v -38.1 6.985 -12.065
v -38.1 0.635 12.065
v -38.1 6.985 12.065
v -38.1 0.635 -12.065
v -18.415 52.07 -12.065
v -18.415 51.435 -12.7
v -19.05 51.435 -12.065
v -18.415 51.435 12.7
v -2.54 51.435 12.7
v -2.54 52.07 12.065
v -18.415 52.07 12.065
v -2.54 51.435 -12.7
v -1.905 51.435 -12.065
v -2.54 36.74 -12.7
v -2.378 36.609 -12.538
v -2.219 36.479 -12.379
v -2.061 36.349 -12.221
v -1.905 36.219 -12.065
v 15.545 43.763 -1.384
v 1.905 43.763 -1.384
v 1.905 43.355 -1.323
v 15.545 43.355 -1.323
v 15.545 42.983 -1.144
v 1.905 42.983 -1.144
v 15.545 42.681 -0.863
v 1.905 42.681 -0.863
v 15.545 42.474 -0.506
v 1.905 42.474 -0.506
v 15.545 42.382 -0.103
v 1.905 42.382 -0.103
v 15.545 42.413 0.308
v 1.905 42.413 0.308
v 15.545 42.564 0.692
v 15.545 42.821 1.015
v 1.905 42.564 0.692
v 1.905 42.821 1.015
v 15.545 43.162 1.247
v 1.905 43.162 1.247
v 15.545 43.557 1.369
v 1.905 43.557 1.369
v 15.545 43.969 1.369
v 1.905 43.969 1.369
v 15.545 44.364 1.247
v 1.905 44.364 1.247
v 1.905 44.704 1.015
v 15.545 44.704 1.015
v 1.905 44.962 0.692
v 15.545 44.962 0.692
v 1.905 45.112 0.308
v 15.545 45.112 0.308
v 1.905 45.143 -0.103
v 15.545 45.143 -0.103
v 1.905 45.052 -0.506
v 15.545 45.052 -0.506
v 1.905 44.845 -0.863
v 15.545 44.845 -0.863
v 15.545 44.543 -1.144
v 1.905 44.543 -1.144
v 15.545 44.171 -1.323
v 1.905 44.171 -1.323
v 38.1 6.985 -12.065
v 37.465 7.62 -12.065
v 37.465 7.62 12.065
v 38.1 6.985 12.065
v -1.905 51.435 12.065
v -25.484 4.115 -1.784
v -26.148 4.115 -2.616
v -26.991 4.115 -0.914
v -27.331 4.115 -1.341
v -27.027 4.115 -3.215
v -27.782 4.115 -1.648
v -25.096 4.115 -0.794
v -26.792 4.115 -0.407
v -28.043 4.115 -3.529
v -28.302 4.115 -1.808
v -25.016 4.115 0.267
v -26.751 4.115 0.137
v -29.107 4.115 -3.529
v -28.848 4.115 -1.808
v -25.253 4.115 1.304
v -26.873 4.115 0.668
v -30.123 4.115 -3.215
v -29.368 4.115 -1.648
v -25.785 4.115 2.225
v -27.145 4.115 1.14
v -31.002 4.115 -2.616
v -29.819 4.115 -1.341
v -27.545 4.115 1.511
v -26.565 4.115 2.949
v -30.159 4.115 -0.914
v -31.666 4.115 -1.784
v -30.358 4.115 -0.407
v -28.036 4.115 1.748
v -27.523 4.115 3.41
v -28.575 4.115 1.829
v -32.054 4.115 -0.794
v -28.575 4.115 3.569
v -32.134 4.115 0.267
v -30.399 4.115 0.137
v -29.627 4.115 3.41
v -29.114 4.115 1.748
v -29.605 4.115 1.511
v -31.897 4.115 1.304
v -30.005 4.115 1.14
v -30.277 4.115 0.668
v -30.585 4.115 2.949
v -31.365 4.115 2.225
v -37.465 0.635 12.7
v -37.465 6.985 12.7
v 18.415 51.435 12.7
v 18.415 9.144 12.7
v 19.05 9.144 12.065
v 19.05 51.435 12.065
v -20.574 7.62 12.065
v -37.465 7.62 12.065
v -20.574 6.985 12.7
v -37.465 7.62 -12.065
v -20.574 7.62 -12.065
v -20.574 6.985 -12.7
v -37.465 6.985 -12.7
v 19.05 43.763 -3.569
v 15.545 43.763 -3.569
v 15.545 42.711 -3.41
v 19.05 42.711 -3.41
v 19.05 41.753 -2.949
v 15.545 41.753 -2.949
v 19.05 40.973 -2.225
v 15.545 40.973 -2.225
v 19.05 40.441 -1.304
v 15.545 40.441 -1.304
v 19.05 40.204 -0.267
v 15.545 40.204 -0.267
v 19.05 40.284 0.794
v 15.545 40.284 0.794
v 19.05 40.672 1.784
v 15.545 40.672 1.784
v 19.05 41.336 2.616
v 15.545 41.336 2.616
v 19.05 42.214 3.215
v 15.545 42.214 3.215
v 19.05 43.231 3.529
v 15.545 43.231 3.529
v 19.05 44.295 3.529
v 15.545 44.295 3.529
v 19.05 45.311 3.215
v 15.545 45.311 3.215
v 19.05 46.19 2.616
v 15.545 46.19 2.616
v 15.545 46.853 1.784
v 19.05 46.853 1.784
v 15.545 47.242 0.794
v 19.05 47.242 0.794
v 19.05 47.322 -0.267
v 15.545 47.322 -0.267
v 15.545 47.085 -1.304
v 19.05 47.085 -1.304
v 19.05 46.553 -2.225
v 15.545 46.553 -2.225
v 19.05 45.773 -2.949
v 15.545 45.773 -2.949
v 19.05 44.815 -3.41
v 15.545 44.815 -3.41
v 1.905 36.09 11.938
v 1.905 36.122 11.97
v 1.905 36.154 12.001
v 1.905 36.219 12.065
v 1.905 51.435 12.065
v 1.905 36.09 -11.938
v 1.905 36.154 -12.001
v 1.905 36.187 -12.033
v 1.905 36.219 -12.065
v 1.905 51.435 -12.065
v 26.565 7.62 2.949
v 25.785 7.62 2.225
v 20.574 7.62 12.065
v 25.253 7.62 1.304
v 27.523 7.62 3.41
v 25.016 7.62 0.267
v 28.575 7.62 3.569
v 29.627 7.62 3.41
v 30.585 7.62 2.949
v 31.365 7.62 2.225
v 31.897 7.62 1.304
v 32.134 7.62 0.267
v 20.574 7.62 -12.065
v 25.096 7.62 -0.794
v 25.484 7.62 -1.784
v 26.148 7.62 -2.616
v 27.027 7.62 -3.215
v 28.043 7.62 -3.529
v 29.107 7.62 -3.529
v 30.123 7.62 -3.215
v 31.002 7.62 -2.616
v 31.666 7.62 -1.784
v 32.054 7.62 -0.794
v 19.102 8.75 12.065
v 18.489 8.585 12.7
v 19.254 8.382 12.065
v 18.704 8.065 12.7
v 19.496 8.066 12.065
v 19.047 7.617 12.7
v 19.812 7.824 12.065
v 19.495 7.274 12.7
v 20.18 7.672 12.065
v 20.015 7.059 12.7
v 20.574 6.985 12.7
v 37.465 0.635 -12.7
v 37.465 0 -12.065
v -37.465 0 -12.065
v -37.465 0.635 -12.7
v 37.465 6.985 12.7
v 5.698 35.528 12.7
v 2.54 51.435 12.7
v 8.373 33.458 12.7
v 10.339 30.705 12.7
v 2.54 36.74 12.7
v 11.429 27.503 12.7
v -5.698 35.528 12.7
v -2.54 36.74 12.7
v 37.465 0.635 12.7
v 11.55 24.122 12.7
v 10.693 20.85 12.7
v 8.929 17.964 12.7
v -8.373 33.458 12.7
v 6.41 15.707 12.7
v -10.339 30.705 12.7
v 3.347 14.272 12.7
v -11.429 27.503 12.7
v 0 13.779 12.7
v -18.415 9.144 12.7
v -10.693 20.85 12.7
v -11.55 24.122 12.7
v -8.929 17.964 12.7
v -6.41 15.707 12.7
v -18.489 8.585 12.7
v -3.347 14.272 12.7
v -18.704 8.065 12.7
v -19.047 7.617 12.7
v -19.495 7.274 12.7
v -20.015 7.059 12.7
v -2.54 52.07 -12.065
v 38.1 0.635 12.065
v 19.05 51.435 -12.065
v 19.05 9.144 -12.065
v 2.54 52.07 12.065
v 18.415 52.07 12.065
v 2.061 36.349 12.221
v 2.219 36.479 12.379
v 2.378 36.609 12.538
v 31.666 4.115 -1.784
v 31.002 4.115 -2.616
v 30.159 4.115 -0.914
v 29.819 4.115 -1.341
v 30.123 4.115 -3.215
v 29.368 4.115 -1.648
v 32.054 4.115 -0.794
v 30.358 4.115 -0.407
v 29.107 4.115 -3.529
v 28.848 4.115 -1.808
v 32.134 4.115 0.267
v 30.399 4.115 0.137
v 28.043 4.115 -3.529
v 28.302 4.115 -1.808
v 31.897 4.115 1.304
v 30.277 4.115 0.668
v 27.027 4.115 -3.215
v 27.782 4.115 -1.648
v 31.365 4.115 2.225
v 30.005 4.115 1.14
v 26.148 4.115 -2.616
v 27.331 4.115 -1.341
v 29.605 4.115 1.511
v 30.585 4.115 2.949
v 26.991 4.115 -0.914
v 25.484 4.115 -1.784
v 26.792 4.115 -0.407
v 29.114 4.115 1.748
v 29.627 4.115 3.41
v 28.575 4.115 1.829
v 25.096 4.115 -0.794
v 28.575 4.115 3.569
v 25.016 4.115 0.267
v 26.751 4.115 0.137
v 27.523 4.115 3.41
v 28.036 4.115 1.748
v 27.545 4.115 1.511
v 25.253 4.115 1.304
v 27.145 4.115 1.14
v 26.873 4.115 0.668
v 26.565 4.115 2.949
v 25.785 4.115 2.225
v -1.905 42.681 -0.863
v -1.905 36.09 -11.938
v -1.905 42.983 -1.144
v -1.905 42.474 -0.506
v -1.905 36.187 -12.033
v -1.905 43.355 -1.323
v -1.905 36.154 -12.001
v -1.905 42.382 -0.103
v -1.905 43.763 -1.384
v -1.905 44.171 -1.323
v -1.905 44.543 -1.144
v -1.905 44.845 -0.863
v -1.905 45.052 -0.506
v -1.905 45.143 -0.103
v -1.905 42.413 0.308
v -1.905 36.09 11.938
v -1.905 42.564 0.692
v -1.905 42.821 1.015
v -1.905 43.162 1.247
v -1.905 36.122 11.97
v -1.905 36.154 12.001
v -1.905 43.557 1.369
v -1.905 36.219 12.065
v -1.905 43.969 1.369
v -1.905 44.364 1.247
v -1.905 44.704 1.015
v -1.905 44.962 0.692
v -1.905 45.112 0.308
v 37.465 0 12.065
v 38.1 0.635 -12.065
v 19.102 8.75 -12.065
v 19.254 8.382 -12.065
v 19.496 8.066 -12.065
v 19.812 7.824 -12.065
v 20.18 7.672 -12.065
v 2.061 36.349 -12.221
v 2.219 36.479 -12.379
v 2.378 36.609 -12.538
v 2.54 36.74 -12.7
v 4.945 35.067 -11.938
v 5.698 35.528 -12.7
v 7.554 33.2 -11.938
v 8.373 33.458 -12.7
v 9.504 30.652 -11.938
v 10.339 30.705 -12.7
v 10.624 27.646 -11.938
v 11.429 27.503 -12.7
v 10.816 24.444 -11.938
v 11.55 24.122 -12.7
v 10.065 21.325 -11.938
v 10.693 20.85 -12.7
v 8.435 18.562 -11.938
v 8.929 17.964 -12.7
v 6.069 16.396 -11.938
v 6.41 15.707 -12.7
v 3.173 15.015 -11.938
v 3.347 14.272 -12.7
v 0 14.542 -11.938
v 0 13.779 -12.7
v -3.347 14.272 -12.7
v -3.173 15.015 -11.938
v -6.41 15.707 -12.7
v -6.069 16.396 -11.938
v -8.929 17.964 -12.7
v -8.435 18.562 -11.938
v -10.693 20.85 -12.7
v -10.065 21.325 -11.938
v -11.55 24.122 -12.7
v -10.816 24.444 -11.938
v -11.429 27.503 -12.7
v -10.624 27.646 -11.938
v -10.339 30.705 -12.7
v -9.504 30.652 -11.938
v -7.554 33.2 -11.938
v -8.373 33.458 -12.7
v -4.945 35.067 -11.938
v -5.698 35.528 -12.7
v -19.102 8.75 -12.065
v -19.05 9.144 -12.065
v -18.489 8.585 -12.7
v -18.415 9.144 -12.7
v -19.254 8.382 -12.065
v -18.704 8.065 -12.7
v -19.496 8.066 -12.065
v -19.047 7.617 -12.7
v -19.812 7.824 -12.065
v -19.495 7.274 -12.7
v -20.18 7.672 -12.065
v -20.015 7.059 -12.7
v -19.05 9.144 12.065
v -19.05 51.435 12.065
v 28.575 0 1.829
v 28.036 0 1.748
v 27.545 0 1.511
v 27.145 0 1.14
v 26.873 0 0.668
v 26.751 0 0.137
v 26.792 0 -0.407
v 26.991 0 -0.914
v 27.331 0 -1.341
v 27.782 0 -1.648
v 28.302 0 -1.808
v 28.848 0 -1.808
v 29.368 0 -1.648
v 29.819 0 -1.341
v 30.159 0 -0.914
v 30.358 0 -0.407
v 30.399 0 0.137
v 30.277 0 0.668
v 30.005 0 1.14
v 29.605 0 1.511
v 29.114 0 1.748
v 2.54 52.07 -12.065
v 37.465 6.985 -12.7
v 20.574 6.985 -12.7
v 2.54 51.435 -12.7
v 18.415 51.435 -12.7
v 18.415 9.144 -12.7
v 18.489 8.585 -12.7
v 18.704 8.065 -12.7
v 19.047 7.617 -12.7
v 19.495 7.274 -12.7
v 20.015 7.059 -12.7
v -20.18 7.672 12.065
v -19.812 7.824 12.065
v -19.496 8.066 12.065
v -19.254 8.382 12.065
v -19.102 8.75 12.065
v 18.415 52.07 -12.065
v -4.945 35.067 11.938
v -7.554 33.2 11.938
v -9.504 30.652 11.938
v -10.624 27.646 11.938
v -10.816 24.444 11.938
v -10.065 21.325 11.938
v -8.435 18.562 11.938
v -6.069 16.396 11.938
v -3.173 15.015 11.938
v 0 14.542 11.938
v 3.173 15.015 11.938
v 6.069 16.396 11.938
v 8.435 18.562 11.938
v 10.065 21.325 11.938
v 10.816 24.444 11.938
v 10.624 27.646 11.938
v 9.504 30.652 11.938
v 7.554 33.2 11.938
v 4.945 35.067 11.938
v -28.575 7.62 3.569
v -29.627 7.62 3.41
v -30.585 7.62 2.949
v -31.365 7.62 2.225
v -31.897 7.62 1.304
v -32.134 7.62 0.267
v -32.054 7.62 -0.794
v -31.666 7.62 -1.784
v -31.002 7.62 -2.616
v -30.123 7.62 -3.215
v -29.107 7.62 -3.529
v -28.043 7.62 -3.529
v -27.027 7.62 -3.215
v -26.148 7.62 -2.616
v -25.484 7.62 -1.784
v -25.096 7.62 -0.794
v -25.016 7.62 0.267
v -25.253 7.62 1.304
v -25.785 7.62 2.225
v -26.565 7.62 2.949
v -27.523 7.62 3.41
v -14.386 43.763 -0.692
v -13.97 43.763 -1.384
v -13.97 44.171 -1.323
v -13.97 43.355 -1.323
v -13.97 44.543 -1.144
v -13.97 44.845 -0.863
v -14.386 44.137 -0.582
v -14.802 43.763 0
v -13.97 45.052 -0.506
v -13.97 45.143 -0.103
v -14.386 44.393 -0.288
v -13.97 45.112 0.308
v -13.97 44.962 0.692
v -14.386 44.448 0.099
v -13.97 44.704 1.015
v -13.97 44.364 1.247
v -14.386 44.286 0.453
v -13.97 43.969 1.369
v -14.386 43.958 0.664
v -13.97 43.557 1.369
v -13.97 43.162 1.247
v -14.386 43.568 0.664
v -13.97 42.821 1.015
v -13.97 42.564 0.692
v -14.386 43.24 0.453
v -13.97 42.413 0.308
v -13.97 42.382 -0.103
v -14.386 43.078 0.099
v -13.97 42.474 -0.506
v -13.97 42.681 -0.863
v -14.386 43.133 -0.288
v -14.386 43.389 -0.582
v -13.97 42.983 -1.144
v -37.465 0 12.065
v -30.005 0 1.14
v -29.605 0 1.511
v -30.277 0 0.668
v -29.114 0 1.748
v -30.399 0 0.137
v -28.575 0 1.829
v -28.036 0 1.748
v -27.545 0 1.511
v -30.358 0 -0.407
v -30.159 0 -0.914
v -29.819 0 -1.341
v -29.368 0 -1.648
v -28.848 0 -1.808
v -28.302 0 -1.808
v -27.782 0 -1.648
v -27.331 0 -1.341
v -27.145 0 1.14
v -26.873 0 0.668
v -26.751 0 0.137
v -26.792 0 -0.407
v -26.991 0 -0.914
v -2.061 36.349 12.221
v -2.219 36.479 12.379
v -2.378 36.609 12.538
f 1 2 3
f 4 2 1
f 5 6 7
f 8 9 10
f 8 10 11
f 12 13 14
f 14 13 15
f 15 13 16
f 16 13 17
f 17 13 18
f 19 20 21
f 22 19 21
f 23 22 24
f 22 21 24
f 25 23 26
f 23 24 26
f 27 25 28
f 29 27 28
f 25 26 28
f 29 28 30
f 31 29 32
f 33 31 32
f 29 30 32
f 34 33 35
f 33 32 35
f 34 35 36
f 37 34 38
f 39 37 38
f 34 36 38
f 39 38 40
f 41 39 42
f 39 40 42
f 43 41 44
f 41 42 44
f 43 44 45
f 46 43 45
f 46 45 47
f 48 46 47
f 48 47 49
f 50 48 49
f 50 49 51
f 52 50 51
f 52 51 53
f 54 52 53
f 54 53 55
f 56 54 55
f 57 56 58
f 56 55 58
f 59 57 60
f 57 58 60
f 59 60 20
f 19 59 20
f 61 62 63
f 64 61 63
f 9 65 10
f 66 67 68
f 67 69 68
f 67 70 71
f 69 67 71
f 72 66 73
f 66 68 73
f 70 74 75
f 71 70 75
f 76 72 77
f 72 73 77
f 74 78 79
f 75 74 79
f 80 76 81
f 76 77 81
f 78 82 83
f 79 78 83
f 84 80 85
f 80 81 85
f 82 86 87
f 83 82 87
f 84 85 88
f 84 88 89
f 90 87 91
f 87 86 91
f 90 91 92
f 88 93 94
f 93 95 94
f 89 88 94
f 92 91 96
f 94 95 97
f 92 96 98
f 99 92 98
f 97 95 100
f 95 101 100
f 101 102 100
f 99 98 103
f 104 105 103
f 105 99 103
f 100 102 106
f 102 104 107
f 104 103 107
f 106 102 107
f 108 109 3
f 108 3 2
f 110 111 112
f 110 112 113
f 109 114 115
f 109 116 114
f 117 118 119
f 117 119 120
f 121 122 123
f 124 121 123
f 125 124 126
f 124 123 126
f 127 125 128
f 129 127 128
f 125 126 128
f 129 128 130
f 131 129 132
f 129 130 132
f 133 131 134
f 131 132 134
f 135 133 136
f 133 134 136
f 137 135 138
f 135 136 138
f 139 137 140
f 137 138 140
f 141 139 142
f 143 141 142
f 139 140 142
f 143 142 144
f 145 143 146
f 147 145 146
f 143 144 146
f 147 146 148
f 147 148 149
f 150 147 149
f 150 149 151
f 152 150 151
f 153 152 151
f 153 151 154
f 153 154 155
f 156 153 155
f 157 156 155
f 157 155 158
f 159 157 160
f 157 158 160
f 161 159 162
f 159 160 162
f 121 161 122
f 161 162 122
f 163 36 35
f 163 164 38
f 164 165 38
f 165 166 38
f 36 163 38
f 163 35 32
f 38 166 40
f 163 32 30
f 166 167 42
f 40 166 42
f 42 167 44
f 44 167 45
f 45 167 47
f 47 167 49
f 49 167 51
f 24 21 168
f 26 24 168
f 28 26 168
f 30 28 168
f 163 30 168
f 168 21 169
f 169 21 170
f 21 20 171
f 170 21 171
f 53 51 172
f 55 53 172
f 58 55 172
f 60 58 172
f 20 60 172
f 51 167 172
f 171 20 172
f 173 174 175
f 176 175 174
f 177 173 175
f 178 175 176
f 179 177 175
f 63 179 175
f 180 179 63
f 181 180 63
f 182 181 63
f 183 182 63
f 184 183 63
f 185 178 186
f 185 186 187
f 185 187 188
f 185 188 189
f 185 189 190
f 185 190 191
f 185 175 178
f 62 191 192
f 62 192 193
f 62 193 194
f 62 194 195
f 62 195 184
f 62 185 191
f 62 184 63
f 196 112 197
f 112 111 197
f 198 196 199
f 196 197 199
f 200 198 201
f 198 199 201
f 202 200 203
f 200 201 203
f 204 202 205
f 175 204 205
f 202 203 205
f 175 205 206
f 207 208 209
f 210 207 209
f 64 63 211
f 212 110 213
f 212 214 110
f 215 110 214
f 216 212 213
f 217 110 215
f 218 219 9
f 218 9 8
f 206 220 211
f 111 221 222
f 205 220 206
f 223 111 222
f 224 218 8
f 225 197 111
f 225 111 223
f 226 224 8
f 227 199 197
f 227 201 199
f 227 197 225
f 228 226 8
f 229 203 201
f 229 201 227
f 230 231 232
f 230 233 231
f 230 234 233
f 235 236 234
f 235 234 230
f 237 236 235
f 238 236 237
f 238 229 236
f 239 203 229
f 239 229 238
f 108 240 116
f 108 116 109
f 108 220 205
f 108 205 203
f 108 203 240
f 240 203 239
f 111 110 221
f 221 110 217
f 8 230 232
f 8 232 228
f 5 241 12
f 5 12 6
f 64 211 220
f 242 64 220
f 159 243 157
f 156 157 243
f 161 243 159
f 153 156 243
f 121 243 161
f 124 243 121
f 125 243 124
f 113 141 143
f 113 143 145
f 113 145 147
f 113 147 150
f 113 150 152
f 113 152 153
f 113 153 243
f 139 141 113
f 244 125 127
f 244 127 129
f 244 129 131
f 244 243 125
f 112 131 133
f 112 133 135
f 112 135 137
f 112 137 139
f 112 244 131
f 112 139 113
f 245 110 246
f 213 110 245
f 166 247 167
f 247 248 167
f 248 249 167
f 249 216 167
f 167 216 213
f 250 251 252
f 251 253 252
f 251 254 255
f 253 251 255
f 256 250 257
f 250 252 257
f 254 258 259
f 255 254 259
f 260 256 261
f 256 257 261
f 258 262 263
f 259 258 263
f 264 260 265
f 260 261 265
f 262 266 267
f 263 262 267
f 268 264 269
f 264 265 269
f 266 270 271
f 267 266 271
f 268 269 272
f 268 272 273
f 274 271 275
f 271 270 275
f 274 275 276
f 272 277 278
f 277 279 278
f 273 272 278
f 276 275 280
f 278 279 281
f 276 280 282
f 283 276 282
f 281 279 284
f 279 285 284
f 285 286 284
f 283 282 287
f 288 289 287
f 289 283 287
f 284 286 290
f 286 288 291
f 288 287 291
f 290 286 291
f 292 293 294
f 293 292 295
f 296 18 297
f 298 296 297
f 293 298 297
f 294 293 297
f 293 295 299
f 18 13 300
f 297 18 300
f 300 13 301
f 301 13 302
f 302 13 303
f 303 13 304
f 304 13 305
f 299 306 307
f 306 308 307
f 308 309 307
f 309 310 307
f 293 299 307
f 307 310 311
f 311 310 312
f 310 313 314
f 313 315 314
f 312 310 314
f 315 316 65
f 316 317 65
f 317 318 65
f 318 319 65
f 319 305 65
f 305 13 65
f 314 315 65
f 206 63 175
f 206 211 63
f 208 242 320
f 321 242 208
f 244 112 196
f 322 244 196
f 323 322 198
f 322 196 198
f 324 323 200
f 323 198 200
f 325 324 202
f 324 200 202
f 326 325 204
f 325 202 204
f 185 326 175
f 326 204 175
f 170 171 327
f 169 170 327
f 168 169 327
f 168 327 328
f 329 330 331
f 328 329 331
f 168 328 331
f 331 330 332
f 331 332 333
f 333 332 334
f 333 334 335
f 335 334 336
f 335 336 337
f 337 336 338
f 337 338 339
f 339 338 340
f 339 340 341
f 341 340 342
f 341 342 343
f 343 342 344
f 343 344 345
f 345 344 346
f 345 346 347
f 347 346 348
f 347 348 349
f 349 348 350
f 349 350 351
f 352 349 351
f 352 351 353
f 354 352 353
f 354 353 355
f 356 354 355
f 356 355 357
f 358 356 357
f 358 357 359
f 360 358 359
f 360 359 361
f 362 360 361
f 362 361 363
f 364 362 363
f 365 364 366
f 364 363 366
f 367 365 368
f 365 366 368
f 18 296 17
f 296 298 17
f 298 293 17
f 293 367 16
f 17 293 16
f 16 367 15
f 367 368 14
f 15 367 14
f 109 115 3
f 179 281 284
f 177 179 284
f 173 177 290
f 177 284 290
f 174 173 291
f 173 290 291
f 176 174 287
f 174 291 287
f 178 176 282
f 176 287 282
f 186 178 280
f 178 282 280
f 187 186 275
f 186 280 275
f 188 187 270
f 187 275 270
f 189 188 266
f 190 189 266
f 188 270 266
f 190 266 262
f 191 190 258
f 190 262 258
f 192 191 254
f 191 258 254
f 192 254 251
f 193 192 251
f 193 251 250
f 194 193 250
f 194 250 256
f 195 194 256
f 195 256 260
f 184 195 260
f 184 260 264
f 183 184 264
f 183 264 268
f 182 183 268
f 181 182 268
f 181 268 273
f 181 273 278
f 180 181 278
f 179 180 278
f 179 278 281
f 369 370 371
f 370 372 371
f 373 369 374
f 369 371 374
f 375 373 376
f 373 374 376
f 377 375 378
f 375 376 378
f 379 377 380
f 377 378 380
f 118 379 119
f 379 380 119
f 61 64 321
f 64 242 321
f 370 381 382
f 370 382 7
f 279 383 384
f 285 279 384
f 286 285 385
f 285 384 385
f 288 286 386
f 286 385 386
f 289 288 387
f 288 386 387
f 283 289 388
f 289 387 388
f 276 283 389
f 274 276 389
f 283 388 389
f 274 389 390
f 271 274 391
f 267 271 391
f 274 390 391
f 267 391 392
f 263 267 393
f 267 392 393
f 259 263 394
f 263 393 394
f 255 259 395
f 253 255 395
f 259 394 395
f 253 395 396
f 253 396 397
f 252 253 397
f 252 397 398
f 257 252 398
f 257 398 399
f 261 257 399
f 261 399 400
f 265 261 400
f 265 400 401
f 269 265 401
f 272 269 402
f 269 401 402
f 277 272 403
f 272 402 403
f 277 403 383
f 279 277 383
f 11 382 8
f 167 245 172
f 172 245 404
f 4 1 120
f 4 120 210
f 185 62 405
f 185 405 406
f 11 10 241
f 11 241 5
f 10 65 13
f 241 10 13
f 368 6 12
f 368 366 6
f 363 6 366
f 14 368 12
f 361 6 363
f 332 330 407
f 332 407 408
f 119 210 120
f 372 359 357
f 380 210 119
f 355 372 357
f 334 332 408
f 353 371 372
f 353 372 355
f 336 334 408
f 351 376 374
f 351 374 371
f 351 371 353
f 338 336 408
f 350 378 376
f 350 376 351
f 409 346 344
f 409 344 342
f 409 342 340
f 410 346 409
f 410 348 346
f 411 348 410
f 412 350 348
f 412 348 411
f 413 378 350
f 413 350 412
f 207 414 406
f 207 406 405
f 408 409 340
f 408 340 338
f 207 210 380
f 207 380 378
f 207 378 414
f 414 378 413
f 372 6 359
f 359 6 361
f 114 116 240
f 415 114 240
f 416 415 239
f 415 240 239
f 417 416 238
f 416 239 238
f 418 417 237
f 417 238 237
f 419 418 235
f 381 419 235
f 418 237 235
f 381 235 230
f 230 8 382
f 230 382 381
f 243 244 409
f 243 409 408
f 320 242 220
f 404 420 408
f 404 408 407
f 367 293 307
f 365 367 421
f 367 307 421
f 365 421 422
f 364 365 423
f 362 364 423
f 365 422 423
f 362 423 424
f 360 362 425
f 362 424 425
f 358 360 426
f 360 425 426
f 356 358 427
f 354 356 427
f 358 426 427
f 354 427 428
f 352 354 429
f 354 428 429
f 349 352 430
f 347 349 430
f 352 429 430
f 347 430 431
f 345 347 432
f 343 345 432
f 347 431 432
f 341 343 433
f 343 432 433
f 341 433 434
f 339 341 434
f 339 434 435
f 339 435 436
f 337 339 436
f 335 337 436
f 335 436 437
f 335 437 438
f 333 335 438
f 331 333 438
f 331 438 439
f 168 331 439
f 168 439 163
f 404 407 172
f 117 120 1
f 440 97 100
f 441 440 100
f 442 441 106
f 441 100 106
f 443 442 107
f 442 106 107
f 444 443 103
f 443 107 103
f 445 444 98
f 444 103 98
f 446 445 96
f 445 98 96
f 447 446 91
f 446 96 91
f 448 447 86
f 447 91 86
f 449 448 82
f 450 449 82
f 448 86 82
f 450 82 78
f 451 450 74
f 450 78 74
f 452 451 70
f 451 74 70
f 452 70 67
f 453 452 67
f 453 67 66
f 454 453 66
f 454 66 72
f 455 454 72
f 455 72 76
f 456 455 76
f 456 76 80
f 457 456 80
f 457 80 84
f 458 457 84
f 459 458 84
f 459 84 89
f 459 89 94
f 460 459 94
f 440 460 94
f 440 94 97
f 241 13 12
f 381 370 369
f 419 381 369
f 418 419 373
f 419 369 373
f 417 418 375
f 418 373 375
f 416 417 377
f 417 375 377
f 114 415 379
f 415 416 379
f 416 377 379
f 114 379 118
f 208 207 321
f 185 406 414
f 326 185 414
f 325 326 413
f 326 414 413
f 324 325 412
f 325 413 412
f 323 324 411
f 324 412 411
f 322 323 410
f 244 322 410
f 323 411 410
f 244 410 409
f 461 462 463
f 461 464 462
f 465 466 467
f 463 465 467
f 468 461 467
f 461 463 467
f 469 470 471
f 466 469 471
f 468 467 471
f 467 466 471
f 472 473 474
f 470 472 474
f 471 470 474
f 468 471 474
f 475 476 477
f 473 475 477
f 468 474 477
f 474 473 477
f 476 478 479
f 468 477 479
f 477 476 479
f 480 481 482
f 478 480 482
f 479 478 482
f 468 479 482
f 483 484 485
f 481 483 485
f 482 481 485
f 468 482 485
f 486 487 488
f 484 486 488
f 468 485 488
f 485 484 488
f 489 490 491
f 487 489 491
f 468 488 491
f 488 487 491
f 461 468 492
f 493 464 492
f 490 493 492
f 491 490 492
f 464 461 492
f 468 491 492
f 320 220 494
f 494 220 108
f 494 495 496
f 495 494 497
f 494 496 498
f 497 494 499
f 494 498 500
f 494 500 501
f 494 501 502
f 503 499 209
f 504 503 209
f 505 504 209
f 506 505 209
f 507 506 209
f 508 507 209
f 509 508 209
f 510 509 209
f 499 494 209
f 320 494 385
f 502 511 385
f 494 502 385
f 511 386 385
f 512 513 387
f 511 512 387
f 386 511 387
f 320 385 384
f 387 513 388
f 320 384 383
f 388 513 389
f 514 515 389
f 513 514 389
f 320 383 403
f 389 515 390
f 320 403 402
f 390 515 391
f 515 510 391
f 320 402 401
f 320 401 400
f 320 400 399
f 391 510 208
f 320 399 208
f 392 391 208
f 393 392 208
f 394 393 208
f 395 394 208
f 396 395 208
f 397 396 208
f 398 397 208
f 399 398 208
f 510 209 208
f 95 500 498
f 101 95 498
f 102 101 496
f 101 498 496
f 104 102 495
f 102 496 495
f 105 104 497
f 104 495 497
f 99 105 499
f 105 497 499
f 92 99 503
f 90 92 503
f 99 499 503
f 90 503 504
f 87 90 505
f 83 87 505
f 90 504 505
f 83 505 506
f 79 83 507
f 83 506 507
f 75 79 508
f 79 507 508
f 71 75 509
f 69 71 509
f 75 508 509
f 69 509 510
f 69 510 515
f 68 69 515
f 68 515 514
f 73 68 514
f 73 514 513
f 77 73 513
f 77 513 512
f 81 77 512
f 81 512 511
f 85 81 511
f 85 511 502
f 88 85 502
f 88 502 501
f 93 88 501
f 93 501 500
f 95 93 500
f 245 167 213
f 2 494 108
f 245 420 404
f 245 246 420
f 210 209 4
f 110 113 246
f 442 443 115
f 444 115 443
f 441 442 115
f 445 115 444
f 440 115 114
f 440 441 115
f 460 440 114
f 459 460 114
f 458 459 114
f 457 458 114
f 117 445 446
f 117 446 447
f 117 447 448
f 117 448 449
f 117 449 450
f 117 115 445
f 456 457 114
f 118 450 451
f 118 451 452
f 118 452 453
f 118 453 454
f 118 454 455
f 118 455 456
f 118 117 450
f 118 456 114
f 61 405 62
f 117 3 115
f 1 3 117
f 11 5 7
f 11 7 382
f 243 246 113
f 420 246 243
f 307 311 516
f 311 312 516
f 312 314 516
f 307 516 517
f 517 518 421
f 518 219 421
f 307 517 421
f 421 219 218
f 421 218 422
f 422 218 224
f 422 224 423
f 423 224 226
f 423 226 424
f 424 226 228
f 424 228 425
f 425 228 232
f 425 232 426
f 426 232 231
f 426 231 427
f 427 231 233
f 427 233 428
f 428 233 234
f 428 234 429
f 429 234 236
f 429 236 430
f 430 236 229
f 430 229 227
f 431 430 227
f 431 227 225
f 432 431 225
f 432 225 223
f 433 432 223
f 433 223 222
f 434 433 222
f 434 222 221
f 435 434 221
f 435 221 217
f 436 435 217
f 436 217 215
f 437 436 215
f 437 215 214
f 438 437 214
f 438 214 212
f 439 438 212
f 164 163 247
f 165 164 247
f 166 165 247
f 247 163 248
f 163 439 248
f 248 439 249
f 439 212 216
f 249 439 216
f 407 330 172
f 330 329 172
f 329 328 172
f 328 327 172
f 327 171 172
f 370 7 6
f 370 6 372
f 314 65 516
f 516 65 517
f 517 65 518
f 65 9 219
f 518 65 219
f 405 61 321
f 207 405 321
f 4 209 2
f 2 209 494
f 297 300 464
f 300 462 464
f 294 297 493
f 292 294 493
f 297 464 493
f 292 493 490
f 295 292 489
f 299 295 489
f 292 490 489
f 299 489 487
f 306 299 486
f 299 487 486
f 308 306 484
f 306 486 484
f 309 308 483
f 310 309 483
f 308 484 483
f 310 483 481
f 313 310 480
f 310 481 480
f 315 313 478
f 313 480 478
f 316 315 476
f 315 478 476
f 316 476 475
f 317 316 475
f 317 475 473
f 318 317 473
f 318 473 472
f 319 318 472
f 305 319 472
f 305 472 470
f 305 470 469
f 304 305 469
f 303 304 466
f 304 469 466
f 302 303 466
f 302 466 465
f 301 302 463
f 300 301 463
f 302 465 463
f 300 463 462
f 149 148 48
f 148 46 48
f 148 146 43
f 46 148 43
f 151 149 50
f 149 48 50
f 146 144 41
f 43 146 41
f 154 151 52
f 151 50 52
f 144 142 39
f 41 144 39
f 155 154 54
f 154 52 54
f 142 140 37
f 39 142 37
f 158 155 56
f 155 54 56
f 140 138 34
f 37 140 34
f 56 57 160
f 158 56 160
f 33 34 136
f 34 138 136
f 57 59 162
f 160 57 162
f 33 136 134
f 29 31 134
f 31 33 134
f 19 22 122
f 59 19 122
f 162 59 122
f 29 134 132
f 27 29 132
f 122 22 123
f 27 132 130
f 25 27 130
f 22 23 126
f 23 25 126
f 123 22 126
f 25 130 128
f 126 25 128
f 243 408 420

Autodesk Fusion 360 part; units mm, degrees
sketch "Sketch1" plane through (0, 0, 0) normal (0, 1, 0) x (1, 0, 0)
  line L0 (-31.75, 12.7) -> (31.75, 12.7)
  line L1 (38.1, 6.35) -> (38.1, -6.35)
  line L2 (31.75, -12.7) -> (-31.75, -12.7)
  line L3 (-38.1, -6.35) -> (-38.1, 6.35)
  line L4 (38.1, -6.35) -> (38.1, -12.7)
  line L5 (38.1, -12.7) -> (31.75, -12.7)
  line L6 (38.1, 6.35) -> (38.1, 12.7)
  line L7 (38.1, 12.7) -> (31.75, 12.7)
  line L8 (-38.1, 6.35) -> (-38.1, 12.7)
  line L9 (-38.1, 12.7) -> (-31.75, 12.7)
  line L10 (-38.1, -6.35) -> (-38.1, -12.7)
  line L11 (-38.1, -12.7) -> (-31.75, -12.7)
  point P0 (-38.1, 12.7)
  point P1 (38.1, 12.7)
  point P2 (38.1, -12.7)
  point P3 (-38.1, -12.7)
extrude "Extrude1" add sketch "Sketch1" along normal blind 7.62
sketch "Sketch2" plane through (0, 7.62, 0) normal (0, 1, 0) x (-1, 0, 0)
  line L0 (38.1, -12.7) -> (38.1, 12.7)
  line L1 (38.1, 12.7) -> (-38.1, 12.7)
  line L2 (-38.1, 12.7) -> (-38.1, -12.7)
  line L3 (-38.1, -12.7) -> (38.1, -12.7)
  line L4 (-19.05, 12.7) -> (19.05, 12.7)
  line L5 (19.05, 12.7) -> (19.05, -12.7)
  line L6 (19.05, -12.7) -> (-19.05, -12.7)
  line L7 (-19.05, -12.7) -> (-19.05, 12.7)
  line L8 (-19.05, 12.7) -> (19.05, -12.7) construction
  line L9 (19.05, 12.7) -> (-19.05, -12.7) construction
  dimension "d12" = 38.1
extrude "Extrude2" add sketch "Sketch2" along normal blind 44.45 contours L1 L3 L4 L5 L6 L7
sketch "Sketch3" plane through (0, 0, 12.7) normal (0, 0, 1) x (1, 0, 0)
  line L0 (-38.1, 0) -> (38.1, 0)
  line L1 (38.1, 7.62) -> (19.05, 7.62)
  line L2 (19.05, 7.62) -> (19.05, 52.07)
  line L3 (19.05, 52.07) -> (-19.05, 52.07)
  line L4 (-19.05, 52.07) -> (-19.05, 7.62)
  circle A0 centre (0, 25.4) radius 10.8585
  line L5 (38.1, 0) -> (38.1, 7.62)
  line L6 (-19.05, 7.62) -> (-38.1, 7.62)
  line L7 (-38.1, 7.62) -> (-38.1, 0)
  dimension "d15" = 25.4
  dimension "d16" = 21.717
  dimension "d47" = 25.4
extrude "Extrude3" cut sketch "Sketch3" against normal blind 25.4 contours A0
sketch "Sketch4" plane through (0, 52.07, 0) normal (0, 1, 0) x (-1, 0, 0)
  line L0 (-19.05, -12.7) -> (19.05, -12.7)
  line L1 (19.05, -12.7) -> (19.05, 12.7)
  line L2 (19.05, 12.7) -> (-19.05, 12.7)
  line L3 (-19.05, 12.7) -> (-19.05, -12.7)
  line L4 (-1.905, -12.7) -> (1.905, -12.7)
  line L5 (1.905, -12.7) -> (1.905, 12.7)
  line L6 (1.905, 12.7) -> (-1.905, 12.7)
  line L7 (-1.905, 12.7) -> (-1.905, -12.7)
  line L8 (-1.905, -12.7) -> (1.905, 12.7) construction
  line L9 (1.905, -12.7) -> (-1.905, 12.7) construction
  dimension "d19" = 3.81
extrude "Extrude4" cut sketch "Sketch4" along normal up to surface contours L0 L2 L4 L5 L6 L7 end surface at (10.8045, 24.3188, -4.2333)
fillet "Fillet1" radius 1.524 1 edges at (19.05, 7.62, 0)
fillet "Fillet1" radius 1.524 1 edges at (-19.05, 7.62, 0)
chamfer "Chamfer1" distance 0.635 angle 45 34 edges at (-19.05, 30.607, -12.7) (-19.05, 30.607, 12.7) (-19.4964, 8.0664, 12.7) (-29.337, 7.62, 12.7) (-19.4964, 8.0664, -12.7) (-29.337, 7.62, -12.7) (19.4964, 8.0664, -12.7) (29.337, 7.62, -12.7) (19.05, 30.607, -12.7) (29.337, 7.62, 12.7) (19.4964, 8.0664, 12.7) (19.05, 30.607, 12.7) (0, 0, -12.7) (-38.1, 0, 0) (-38.1, 3.81, -12.7) (38.1, 3.81, -12.7) (38.1, 0, 0) (38.1, 7.62, 0) (-38.1, 7.62, 0) (38.1, 3.81, 12.7) (0, 0, 12.7) (-38.1, 3.81, 12.7) (1.905, 44.08, -12.7) (1.905, 44.08, 12.7) (-1.905, 52.07, 0) (-1.905, 44.08, 12.7) (-1.905, 44.08, -12.7) (-10.4775, 52.07, -12.7) (-19.05, 52.07, 0) (-10.4775, 52.07, 12.7) (10.4775, 52.07, -12.7) (1.905, 52.07, 0) (19.05, 52.07, 0) (10.4775, 52.07, 12.7)
chamfer "Chamfer3" distance 0.762 angle 45 2 edges at (0, 14.5415, -12.7) (0, 14.5415, 12.7)
ref_plane "WorkPlane1" through (0, 26.035, 0) normal (0, 0, -1) x (-1, 0, 0)
sketch "Sketch5" plane through (0, 7.62, 0) normal (0, 1, 0) x (-1, 0, 0)
  line L0 (37.465, 12.065) -> (20.574, 12.065)
  line L1 (20.574, 12.065) -> (20.574, -12.065)
  line L2 (20.574, -12.065) -> (37.465, -12.065)
  line L3 (37.465, -12.065) -> (37.465, 12.065)
  line L4 (38.1, -12.065) -> (38.1, 12.065)
  line L5 (-38.1, 12.065) -> (-38.1, -12.065)
  point P0 (28.575, 0)
  point P1 (-28.575, 0)
  dimension "d33" = 9.525
  dimension "d34" = 9.525
hole "Hole1" at (-28.575, 7.62, 0) at (28.575, 7.62, 0) direction (0, -1, 0) diameter 3.6576 end through all counterbore diameter 7.1374 counterbore depth 3.5052
hole "Hole2" at (19.05, 43.7629, 0) direction (-1, 0, 0) diameter 2.7686 depth 33.02 tip angle 118 counterbore diameter 7.1374 counterbore depth 3.5052
move_body "Move1" bodies 1 to x (1, 0, 0) y (0, 1, 0) z (0, 0, 1) at (-152.4, 0, 0)
move_body "Move2" bodies 1 to x (1, 0, 0) y (0, 1, 0) z (0, 0, 1) at (152.4, 0, 0)
